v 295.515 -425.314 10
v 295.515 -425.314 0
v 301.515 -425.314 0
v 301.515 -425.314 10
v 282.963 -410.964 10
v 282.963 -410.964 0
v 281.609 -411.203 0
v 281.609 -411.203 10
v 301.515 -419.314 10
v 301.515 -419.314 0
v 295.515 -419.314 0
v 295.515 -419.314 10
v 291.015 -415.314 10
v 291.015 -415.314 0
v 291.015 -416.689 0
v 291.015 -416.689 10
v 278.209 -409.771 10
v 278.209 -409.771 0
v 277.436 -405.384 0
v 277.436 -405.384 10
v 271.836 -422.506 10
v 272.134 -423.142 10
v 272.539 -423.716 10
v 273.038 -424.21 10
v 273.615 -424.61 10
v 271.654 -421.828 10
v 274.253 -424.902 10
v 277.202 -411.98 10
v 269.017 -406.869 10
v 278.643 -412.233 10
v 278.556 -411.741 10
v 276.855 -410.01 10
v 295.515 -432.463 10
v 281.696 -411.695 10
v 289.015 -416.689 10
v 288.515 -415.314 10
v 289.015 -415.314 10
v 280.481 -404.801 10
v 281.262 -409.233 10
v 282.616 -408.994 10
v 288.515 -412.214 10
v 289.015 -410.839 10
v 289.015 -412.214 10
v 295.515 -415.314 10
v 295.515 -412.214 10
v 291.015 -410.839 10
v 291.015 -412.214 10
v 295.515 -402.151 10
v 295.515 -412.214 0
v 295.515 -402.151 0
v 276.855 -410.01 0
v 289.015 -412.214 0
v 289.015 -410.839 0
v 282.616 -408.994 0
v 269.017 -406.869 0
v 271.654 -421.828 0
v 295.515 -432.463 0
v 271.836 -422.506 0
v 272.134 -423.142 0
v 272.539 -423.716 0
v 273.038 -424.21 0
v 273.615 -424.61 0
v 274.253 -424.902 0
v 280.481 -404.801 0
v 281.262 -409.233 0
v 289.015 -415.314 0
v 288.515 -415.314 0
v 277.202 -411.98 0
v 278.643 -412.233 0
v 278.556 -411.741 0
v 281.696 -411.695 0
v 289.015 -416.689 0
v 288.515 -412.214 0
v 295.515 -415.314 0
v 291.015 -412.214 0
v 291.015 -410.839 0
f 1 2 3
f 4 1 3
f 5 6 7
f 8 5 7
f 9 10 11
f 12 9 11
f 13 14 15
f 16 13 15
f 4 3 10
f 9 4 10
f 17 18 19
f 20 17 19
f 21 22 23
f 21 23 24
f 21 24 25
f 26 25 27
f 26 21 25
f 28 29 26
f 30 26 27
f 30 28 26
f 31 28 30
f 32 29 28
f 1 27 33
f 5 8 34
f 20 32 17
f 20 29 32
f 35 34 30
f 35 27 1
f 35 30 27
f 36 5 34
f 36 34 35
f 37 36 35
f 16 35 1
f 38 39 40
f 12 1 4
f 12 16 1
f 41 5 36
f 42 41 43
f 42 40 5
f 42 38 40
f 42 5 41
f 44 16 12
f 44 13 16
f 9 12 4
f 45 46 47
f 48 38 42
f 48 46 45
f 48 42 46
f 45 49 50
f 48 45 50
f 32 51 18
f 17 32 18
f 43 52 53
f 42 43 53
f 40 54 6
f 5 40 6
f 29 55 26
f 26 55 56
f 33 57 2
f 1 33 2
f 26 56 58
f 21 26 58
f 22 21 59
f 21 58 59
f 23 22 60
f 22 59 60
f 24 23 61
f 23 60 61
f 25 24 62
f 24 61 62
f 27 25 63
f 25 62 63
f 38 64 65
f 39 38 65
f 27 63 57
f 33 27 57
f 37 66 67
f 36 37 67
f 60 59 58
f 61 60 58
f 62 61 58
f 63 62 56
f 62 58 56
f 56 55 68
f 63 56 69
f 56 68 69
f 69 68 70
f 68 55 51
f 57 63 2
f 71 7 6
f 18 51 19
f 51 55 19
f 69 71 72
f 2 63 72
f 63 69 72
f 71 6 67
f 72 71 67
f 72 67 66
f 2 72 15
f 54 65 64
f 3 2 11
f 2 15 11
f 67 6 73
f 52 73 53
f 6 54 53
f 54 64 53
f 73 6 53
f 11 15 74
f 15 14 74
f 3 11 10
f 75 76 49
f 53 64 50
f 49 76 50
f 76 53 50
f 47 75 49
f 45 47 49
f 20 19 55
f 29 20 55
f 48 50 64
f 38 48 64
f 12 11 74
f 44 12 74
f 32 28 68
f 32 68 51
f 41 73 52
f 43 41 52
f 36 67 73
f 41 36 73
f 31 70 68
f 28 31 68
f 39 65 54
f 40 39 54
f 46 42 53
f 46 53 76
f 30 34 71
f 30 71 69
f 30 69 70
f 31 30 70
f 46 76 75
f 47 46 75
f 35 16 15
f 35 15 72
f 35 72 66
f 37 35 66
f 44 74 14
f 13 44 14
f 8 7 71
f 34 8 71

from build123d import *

# Parameters (mm, degrees)
DODANIE_WYCI_GNI_CIE1_DEPTH = 10


with BuildPart() as part:
    # Szkic1 → Dodanie-wyciągnięcie1 (new body)
    with BuildSketch(Plane.XY):
        with BuildLine():
            Line((269.016524324, -406.868519497), (271.654292788, -421.82804783))
            ThreePointArc((271.654292788, -421.82804783), (272.538891868, -423.715939148), (274.253329281, -424.902258464))
            Line((274.253329281, -424.902258464), (295.514699013, -432.462846953))
            Line((295.514699013, -432.462846953), (295.514699013, -425.313881279))
            Line((295.514699013, -425.313881279), (301.514699013, -425.313881279))
            Line((301.514699013, -425.313881279), (301.514699013, -419.313881279))
            Line((301.514699013, -419.313881279), (295.514699013, -419.313881279))
            Line((295.514699013, -419.313881279), (295.514699013, -415.313881279))
            Line((295.514699013, -415.313881279), (291.014699013, -415.313881279))
            Line((291.014699013, -415.313881279), (291.014699013, -416.688881279))
            Line((291.014699013, -416.688881279), (289.014699013, -416.688881279))
            Line((289.014699013, -416.688881279), (289.014699013, -415.313881279))
            Line((289.014699013, -415.313881279), (288.514699013, -415.313881279))
            Line((288.514699013, -415.313881279), (288.514699013, -412.213881279))
            Line((288.514699013, -412.213881279), (289.014699013, -412.213881279))
            Line((289.014699013, -412.213881279), (289.014699013, -410.838881279))
            Line((289.014699013, -410.838881279), (291.014699013, -410.838881279))
            Line((291.014699013, -410.838881279), (291.014699013, -412.213881279))
            Line((291.014699013, -412.213881279), (295.514699013, -412.213881279))
            Line((295.514699013, -412.213881279), (295.514699013, -402.150585233))
            Line((295.514699013, -402.150585233), (280.48065548, -404.801492737))
            Line((280.48065548, -404.801492737), (281.26207228, -409.233127626))
            Line((281.26207228, -409.233127626), (282.61618294, -408.994361382))
            Line((282.61618294, -408.994361382), (282.963479295, -410.963976888))
            Line((282.963479295, -410.963976888), (281.609368635, -411.202743132))
            Line((281.609368635, -411.202743132), (281.696192724, -411.695147008))
            Line((281.696192724, -411.695147008), (278.64328869, -412.233456359))
            Line((278.64328869, -412.233456359), (278.556464601, -411.741052483))
            Line((278.556464601, -411.741052483), (277.20235394, -411.979818727))
            Line((277.20235394, -411.979818727), (276.855057585, -410.010203221))
            Line((276.855057585, -410.010203221), (278.209168245, -409.771436977))
            Line((278.209168245, -409.771436977), (277.435547988, -405.384018473))
            Line((277.435547988, -405.384018473), (269.016524324, -406.868519497))
        make_face()
    extrude(amount=DODANIE_WYCI_GNI_CIE1_DEPTH)


solid = part.part
